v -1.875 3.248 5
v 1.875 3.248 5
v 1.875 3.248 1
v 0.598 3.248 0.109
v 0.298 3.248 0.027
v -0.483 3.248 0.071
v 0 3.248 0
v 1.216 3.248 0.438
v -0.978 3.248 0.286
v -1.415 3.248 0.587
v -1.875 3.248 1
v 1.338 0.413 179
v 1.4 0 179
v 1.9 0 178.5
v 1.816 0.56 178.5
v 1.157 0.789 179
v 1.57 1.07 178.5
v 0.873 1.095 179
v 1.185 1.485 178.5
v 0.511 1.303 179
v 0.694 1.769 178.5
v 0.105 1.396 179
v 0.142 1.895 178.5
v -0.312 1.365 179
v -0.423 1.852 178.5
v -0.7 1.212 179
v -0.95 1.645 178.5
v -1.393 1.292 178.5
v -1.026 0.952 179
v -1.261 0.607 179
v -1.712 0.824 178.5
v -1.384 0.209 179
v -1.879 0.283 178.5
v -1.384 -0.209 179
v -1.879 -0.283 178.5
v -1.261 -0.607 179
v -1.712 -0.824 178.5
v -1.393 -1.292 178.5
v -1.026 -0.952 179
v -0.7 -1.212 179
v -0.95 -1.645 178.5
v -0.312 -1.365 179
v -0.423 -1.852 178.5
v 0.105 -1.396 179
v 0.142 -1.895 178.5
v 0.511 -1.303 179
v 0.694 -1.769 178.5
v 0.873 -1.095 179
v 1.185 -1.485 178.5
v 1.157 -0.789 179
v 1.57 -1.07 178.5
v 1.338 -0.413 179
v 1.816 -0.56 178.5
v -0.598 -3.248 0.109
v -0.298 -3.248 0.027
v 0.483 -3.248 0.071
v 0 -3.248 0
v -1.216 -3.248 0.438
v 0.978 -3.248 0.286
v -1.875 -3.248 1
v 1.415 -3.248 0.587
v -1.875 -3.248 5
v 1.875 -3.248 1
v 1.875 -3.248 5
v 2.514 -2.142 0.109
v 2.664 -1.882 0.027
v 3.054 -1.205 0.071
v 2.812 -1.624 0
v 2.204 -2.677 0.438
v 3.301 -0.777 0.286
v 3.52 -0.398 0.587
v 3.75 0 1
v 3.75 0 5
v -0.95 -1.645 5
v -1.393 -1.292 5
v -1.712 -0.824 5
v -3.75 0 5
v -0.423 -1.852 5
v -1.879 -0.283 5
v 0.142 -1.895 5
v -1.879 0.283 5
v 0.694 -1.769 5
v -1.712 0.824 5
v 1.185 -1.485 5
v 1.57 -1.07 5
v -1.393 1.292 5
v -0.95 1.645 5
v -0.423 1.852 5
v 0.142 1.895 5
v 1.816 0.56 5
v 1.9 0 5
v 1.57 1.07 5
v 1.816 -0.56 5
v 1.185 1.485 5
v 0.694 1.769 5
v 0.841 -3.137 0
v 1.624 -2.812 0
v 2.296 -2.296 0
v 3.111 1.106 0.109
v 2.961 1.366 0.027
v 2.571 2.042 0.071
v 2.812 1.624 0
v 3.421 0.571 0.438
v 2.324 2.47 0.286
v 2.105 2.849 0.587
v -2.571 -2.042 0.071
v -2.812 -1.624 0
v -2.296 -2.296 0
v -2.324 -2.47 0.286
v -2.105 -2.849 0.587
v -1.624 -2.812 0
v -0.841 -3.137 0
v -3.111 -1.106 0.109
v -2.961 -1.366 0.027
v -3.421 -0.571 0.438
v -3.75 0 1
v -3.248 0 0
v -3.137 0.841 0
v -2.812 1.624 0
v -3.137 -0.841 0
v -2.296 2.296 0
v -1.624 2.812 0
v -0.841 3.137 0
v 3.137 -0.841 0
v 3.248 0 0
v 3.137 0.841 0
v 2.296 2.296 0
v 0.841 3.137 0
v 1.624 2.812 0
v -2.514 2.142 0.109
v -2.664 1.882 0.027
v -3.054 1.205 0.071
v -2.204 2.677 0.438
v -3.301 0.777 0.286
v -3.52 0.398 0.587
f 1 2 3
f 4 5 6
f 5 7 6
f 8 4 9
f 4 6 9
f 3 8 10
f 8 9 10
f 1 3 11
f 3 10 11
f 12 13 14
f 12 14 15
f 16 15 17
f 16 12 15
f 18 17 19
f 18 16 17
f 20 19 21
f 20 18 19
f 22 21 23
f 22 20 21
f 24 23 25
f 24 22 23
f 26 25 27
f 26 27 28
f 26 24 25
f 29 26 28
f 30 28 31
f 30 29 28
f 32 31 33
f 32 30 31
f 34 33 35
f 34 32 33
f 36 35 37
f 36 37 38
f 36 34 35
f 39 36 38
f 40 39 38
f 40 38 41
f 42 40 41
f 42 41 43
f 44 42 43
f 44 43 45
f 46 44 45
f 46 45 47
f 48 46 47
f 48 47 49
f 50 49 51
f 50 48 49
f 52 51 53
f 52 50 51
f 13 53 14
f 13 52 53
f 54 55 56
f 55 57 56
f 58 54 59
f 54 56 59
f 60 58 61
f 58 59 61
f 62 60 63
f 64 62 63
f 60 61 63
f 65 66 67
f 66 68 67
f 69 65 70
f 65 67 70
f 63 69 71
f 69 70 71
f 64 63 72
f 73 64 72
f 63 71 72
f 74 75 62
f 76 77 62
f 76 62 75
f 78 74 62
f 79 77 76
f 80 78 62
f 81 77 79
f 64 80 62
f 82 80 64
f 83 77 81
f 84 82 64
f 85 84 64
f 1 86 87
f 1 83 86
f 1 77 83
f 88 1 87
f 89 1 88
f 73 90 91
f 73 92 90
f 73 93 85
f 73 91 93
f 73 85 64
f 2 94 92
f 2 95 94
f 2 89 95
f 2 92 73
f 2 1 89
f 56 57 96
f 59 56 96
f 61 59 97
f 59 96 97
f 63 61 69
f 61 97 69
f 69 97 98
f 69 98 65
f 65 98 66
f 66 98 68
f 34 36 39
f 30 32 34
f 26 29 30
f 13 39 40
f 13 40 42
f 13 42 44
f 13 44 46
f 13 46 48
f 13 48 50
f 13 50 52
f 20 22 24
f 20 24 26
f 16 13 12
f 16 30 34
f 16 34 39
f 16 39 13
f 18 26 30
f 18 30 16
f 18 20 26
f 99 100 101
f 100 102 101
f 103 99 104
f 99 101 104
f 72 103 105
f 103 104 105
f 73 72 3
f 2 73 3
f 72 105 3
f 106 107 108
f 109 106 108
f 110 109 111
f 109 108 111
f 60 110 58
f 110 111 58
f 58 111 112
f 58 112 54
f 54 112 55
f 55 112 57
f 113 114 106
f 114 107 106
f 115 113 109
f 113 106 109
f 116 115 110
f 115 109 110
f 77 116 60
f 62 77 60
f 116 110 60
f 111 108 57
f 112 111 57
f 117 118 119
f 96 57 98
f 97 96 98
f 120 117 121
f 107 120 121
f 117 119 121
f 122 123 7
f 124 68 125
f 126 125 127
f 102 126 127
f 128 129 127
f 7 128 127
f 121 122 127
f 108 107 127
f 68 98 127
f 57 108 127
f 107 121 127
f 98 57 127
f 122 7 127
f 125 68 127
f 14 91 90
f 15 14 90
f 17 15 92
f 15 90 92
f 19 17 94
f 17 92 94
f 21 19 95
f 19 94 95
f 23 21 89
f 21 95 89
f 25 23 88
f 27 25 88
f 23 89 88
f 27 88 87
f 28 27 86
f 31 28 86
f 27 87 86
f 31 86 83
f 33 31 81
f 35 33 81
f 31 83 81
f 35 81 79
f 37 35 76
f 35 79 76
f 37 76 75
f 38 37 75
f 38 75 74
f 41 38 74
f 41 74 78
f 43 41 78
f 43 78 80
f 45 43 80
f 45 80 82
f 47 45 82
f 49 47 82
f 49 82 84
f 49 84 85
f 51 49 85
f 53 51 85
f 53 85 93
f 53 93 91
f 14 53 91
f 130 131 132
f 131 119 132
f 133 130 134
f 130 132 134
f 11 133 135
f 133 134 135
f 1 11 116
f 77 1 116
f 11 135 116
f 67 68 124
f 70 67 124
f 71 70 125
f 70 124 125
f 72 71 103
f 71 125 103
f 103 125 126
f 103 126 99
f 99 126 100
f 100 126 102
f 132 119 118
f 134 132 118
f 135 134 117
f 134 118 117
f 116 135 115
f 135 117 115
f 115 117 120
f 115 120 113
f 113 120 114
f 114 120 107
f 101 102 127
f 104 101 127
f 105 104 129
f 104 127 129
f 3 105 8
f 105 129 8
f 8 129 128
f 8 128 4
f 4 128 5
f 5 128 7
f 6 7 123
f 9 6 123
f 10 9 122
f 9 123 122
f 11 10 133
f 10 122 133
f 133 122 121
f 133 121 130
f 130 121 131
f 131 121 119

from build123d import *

# Parameters (mm, degrees)
F0_R     = 2.5
F0_R_2   = 1.9
F1_DEPTH = 5
F2_DEPTH = 179
F7_SIZE  = 0.5


with BuildPart() as f1:
    # F0 (on Top) → F1 (new body)
    with BuildSketch(Plane.XY):
        Polygon((3.75, 0), (1.875, 3.247595), (-1.875, 3.247595), (-3.75, 0), (-1.875, -3.247595), (1.875, -3.247595), align=None)
        Circle(F0_R, mode=Mode.SUBTRACT)
        Circle(F0_R)
        Circle(F0_R_2, mode=Mode.SUBTRACT)
    extrude(amount=F1_DEPTH)

    # F0 (on Top) → F2 (join)
    with BuildSketch(Plane.XY):
        Circle(F0_R_2)
    extrude(amount=F2_DEPTH)

    # F5 (on Front) → F6 (revolve, cut)
    with BuildSketch(Plane.XZ):
        Polygon((3.75, 1), (3.247595, 0), (3.75, 0), align=None)
    revolve(axis=Axis((0, 0, 1.934983), (0, 0, 1)), mode=Mode.SUBTRACT)

    # F7
    f7_edges = [f1.edges().sort_by_distance(p)[0] for p in [
        (-1.9, 0, 179),
    ]]
    chamfer(f7_edges, length=F7_SIZE)


solid = f1.part
